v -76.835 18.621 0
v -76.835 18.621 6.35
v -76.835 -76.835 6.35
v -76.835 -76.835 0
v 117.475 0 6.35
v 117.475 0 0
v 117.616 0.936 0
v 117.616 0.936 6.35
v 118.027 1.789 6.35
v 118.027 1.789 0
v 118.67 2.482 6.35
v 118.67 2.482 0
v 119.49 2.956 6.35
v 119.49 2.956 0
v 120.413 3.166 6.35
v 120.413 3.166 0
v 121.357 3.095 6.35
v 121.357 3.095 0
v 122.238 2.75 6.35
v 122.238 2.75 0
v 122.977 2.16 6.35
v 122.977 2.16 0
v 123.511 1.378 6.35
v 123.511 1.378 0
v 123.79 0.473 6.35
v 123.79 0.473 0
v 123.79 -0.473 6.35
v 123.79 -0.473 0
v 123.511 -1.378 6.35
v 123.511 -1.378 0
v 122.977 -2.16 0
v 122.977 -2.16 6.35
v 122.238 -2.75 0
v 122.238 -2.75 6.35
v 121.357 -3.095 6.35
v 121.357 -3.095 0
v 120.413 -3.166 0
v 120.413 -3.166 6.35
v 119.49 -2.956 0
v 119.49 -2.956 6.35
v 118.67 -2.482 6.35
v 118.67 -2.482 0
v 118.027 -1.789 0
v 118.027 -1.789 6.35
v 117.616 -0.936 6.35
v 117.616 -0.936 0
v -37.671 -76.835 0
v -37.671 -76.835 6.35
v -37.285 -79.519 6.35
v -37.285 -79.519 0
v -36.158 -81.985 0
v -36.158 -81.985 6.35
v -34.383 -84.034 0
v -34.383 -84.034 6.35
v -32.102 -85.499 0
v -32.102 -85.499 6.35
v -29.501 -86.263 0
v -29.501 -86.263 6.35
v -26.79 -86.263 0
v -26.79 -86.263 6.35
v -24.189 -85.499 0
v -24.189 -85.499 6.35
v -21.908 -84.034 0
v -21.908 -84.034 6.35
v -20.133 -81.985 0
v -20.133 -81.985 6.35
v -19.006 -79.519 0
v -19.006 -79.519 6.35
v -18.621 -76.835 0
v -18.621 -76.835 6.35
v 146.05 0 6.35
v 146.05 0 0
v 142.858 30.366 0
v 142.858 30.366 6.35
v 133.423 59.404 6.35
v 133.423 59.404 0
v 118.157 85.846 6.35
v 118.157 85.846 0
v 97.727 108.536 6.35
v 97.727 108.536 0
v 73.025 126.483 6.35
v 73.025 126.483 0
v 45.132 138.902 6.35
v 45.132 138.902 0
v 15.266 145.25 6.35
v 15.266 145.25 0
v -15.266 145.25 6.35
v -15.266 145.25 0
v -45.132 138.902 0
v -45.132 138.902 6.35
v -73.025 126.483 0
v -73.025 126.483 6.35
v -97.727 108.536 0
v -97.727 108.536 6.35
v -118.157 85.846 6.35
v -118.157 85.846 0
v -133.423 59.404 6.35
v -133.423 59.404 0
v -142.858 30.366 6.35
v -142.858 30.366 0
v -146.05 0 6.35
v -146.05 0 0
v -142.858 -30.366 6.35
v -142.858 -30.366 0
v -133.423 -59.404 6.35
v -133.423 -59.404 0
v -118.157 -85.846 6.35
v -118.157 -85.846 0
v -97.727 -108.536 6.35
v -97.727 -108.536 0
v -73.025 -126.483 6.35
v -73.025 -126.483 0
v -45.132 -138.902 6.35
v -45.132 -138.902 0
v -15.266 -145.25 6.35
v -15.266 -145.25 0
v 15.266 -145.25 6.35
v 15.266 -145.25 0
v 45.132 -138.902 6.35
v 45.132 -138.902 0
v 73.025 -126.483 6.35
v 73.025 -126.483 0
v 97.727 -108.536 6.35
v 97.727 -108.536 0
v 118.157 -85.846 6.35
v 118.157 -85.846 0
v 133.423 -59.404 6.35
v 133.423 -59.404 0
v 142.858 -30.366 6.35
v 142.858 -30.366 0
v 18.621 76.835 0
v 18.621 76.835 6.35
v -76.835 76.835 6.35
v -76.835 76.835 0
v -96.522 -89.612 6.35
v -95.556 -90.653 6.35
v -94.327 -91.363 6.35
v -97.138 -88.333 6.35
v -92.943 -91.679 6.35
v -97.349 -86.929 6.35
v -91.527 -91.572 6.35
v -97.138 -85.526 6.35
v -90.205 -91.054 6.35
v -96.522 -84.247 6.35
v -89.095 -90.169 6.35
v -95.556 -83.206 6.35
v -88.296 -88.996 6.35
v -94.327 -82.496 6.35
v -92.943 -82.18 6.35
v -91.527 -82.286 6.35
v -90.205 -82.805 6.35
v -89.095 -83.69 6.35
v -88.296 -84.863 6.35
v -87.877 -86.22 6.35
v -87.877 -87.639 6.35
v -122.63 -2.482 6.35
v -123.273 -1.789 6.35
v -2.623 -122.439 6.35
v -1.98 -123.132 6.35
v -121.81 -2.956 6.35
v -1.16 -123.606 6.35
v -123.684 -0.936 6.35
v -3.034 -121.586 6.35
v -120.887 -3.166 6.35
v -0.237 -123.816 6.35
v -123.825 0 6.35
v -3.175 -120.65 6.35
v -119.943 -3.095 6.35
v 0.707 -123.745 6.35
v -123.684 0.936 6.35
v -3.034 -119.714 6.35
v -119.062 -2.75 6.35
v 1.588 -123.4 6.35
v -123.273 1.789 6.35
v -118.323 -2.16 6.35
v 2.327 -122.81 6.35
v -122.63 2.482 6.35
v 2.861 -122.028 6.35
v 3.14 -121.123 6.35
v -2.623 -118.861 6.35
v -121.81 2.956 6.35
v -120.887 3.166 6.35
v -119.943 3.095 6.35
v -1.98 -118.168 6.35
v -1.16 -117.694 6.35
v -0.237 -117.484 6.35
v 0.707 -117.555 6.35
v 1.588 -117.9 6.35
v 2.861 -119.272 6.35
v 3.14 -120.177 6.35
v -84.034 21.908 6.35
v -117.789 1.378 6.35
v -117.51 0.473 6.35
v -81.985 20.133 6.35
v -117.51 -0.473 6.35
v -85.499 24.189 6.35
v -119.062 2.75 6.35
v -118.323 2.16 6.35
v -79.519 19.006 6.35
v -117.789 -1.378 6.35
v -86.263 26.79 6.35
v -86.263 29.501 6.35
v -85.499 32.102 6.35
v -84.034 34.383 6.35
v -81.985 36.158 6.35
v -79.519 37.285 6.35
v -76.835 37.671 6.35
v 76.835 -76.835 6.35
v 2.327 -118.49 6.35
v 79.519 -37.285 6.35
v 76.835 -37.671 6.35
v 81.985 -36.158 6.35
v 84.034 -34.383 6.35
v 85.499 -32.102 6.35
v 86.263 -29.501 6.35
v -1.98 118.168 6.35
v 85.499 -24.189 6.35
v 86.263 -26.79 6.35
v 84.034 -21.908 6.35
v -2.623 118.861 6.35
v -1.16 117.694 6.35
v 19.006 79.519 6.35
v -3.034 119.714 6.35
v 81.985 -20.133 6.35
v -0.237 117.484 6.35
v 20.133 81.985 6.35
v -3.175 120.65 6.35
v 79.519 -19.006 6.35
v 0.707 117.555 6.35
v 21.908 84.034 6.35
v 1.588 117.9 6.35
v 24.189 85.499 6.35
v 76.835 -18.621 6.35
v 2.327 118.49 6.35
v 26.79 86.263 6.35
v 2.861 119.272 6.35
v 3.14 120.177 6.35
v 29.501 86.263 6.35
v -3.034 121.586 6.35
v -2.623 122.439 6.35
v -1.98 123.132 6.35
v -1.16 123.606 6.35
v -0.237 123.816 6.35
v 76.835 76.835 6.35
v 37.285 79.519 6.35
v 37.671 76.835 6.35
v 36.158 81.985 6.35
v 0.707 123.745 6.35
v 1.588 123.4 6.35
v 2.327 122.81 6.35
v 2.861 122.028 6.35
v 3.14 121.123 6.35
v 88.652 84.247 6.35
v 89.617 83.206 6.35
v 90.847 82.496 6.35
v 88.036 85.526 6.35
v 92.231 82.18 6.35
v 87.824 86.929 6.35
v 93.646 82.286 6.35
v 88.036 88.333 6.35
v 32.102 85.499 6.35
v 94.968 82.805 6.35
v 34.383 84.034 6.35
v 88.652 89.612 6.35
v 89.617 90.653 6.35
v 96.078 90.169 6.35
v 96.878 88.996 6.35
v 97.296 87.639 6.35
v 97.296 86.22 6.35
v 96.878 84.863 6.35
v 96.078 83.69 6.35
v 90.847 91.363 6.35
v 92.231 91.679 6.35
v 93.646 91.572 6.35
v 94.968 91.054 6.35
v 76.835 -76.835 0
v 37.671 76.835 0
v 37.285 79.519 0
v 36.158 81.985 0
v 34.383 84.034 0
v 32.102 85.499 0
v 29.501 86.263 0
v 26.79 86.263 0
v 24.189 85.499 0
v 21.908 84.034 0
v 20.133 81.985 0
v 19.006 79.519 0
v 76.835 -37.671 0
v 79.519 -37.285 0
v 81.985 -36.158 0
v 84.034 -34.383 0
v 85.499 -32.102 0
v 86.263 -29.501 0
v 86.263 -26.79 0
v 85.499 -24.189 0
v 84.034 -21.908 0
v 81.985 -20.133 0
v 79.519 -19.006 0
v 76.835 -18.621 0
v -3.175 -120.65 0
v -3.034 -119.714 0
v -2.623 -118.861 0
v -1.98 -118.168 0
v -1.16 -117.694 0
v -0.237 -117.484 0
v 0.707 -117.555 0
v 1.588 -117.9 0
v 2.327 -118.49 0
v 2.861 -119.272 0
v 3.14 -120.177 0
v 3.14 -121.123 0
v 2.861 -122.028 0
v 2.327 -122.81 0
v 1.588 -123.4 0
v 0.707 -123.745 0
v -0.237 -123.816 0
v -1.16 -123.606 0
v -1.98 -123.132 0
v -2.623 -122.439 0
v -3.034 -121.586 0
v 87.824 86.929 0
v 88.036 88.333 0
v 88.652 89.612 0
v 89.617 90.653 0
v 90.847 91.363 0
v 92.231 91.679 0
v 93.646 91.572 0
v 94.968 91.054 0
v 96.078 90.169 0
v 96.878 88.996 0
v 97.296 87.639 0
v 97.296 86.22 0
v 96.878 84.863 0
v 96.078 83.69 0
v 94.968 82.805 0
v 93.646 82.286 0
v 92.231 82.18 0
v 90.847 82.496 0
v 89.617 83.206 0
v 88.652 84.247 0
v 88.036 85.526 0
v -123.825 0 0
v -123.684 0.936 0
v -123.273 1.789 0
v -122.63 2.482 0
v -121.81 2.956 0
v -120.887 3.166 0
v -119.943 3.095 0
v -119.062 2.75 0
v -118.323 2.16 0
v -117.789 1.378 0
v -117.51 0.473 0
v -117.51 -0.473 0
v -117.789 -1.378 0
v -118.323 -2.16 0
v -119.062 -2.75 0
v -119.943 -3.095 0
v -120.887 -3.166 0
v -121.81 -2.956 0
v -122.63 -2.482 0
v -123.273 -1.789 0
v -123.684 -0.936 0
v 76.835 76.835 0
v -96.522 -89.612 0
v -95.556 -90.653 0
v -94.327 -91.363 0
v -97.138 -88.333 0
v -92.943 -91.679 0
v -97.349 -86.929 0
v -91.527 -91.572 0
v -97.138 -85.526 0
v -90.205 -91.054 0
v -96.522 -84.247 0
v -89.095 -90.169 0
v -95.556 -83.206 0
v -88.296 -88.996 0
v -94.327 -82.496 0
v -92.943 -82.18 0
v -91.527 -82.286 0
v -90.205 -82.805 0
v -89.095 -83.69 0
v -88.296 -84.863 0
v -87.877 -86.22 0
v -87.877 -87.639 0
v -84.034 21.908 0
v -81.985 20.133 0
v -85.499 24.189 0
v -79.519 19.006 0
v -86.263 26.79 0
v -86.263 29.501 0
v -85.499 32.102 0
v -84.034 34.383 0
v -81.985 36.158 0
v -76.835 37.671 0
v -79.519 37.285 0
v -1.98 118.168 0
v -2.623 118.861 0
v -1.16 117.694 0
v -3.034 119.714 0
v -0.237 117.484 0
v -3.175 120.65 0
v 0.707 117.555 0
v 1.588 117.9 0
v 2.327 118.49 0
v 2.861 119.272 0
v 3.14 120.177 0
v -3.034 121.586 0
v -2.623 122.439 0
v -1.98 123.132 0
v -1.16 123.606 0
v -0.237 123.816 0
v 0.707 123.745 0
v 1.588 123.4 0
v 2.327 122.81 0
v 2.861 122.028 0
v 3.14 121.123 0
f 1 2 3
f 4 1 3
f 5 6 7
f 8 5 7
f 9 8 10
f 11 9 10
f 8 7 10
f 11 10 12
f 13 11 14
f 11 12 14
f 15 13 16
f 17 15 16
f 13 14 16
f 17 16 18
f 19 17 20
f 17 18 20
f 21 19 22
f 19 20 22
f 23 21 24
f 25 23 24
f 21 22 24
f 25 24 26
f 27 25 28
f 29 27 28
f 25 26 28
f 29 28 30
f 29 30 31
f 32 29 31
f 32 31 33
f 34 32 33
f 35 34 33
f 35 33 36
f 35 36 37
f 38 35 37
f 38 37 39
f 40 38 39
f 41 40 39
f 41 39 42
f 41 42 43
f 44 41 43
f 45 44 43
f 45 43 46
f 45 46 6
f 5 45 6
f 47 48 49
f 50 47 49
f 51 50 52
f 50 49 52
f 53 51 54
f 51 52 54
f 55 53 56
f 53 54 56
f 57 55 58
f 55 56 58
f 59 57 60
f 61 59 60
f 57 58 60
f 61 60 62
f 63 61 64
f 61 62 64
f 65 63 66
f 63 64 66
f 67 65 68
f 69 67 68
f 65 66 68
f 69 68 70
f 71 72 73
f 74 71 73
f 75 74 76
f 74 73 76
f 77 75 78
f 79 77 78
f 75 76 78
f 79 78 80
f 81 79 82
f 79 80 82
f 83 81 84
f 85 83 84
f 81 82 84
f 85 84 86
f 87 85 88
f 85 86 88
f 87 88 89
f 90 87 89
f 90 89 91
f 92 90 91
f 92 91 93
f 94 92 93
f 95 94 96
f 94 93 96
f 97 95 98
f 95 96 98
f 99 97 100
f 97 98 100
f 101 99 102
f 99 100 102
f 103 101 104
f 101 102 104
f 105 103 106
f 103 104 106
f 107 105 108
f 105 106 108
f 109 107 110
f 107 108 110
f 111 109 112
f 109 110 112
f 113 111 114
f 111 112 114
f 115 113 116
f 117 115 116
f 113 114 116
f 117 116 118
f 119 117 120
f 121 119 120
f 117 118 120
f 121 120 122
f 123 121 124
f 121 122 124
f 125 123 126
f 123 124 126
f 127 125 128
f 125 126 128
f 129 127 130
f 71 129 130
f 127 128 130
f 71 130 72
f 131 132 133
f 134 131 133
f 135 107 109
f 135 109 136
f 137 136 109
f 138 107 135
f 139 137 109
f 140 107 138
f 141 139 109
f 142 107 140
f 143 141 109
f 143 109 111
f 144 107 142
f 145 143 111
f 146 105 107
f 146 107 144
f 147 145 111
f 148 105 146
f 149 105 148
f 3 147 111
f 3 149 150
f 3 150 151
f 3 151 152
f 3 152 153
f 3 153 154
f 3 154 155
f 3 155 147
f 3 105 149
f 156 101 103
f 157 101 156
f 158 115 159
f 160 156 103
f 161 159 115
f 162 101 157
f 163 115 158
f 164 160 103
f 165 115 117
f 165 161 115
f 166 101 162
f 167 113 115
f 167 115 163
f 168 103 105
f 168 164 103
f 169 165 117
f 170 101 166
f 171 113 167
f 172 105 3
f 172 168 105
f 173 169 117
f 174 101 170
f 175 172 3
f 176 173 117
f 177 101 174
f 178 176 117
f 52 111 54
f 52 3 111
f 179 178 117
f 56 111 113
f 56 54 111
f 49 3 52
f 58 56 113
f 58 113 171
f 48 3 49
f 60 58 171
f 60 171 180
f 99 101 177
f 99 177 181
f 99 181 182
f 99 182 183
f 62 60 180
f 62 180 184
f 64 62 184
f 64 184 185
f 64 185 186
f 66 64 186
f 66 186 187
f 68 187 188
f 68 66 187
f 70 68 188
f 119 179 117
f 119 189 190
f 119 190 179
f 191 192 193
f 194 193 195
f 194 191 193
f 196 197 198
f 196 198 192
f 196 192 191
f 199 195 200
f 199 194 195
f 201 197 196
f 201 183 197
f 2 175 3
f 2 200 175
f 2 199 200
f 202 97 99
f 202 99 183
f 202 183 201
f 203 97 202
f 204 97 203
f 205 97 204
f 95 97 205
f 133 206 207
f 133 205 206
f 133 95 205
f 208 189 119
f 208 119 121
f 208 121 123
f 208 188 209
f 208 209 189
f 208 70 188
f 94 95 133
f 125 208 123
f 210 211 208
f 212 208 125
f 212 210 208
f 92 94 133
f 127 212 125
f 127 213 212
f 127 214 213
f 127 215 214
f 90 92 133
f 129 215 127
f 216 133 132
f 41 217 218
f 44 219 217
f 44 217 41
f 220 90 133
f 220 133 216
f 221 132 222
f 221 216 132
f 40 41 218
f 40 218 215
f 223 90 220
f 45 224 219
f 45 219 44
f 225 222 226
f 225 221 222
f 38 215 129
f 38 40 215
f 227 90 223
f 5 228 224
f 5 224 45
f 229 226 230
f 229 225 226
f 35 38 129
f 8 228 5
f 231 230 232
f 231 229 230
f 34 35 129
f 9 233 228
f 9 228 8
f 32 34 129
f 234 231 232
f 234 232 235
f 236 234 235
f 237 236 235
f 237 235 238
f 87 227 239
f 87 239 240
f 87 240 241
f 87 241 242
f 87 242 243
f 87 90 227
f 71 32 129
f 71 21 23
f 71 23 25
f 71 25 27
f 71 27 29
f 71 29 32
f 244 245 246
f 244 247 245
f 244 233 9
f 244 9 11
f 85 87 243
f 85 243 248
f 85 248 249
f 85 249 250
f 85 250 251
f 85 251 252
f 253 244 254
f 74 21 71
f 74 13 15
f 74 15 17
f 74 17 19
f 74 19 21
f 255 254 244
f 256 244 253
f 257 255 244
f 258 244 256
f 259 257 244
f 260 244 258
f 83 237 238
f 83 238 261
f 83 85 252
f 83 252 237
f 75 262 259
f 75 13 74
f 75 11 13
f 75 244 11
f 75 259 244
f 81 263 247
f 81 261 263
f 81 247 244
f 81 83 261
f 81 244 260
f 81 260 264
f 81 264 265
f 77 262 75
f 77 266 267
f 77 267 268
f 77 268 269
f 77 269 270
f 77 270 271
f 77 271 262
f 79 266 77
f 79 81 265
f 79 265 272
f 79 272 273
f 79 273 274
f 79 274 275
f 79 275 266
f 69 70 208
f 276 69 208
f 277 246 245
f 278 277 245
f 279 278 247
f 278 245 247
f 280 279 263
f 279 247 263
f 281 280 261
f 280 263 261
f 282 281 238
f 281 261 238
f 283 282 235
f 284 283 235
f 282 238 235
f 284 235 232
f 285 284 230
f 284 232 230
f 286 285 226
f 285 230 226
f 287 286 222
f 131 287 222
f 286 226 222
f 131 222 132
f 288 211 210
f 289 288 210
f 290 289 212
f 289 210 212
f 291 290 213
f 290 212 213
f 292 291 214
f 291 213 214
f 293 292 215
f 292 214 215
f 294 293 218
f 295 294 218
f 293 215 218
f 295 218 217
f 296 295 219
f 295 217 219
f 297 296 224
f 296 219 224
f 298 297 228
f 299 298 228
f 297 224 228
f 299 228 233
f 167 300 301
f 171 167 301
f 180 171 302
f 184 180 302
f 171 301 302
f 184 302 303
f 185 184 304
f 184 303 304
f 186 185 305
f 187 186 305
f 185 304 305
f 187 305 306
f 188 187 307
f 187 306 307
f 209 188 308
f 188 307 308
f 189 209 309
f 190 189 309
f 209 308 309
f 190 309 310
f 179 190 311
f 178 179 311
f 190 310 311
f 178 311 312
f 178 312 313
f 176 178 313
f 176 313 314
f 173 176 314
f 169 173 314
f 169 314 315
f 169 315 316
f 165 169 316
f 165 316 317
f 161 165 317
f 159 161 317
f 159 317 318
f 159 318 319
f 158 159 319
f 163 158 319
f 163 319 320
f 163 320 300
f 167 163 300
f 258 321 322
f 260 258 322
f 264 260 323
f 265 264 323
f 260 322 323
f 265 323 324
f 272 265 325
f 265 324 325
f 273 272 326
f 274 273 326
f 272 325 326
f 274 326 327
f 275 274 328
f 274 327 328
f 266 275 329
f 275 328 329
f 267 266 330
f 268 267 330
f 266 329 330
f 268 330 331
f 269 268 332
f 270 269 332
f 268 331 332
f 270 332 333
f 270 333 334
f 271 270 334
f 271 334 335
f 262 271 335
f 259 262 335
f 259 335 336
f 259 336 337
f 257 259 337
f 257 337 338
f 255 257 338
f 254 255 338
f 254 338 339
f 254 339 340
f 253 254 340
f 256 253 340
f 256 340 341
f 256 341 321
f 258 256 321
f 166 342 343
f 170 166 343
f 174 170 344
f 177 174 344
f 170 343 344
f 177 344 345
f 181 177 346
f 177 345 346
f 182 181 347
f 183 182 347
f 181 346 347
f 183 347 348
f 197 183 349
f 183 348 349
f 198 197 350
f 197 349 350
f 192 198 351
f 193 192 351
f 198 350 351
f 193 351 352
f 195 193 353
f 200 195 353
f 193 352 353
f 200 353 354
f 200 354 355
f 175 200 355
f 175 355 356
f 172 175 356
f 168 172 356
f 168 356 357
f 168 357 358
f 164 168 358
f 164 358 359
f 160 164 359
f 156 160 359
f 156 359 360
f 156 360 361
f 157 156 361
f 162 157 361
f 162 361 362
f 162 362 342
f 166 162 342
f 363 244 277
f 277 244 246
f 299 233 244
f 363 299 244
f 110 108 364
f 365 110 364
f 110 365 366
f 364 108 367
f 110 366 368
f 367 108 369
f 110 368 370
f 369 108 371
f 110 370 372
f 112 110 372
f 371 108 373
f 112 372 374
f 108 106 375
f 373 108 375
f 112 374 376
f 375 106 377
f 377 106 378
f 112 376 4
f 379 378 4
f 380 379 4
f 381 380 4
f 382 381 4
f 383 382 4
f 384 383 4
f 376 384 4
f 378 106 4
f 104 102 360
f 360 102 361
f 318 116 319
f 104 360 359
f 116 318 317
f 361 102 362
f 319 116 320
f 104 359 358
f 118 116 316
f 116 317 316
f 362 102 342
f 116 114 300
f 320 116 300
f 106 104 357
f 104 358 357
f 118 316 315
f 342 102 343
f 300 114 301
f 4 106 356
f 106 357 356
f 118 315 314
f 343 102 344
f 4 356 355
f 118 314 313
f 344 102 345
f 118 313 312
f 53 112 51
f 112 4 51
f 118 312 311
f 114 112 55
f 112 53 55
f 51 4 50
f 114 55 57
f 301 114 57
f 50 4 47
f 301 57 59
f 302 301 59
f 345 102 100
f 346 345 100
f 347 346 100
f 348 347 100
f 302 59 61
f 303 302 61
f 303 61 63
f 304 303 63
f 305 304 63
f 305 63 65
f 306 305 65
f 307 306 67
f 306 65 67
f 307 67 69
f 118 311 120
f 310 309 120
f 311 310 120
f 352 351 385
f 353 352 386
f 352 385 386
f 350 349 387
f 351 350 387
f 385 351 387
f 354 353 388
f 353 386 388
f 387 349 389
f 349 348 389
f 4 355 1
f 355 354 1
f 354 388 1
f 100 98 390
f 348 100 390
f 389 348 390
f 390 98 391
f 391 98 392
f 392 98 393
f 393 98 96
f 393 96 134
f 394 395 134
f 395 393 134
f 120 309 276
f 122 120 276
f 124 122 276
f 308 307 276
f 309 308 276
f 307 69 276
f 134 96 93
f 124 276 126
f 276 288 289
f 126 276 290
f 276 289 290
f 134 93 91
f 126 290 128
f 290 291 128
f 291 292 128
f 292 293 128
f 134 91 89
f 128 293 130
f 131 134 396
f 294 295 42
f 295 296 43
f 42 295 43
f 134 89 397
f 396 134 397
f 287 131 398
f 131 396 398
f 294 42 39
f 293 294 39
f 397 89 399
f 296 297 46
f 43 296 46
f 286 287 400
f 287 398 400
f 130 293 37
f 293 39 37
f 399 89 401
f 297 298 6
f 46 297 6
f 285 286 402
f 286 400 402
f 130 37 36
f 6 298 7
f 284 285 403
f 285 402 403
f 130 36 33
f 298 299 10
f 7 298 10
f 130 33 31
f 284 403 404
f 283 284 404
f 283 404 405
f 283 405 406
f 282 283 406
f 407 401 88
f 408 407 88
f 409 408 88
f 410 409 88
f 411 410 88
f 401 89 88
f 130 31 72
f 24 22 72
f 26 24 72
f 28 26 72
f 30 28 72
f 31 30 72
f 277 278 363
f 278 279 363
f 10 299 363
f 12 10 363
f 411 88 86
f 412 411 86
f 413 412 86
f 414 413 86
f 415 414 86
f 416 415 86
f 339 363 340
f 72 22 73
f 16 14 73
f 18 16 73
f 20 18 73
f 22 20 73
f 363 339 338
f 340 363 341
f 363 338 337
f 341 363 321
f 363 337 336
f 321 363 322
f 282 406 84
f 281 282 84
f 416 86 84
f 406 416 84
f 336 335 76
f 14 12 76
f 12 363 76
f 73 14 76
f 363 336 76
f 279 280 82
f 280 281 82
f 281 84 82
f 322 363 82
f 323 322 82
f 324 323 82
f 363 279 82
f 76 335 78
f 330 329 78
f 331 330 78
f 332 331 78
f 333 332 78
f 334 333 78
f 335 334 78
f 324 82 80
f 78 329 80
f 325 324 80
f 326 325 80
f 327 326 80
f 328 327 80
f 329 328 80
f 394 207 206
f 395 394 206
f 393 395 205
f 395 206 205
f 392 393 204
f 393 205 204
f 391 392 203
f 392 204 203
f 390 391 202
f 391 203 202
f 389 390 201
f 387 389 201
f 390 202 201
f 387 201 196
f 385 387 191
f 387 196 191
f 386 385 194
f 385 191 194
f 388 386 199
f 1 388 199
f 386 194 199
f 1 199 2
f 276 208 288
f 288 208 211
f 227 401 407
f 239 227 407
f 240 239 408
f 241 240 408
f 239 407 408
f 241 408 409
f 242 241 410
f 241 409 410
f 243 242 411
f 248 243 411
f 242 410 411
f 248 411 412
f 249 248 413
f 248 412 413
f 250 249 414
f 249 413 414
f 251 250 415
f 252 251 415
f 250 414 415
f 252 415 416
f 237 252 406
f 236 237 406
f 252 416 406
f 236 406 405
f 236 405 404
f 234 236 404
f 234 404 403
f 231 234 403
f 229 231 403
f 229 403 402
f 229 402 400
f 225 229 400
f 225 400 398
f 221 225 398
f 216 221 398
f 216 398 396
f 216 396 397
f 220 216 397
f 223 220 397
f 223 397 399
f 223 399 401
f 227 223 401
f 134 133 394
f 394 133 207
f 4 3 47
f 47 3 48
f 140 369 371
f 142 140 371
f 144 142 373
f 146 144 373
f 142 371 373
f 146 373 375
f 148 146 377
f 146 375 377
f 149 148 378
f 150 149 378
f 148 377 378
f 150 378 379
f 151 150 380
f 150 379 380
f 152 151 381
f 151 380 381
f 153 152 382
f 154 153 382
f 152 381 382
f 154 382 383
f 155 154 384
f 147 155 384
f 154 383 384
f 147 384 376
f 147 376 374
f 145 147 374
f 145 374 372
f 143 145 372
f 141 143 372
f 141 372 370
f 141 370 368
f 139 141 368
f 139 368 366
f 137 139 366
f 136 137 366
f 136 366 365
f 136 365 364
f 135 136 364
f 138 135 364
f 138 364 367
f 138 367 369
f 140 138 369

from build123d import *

# Parameters (mm, degrees)
F0_R     = 146.05
F1_DEPTH = 6.35
F3_D     = 6.35
F4_D     = 9.525
F6_DEPTH = 6.351


with BuildPart() as f1:
    # F0 (on Top) → F1 (new body)
    with BuildSketch(Plane.XY):
        Circle(F0_R)
    extrude(amount=F1_DEPTH)

    # F3 (through all)
    with Locations(Plane.XY.offset(6.35)):
        with Locations((120.65, 0), (0, -120.65), (-120.65, 0), (0, 120.65)):
            Hole(F3_D / 2)

    # F4 (through all)
    with Locations(Plane.XY.offset(6.35)):
        with Locations((-92.586648, -86.929354), (92.586648, 86.929354)):
            Hole(F4_D / 2)

    # F5 (on face) → F6 (cut, through all)
    with BuildSketch(Plane.XY.offset(6.35)):
        with BuildLine():
            Line((76.835, -18.620527), (76.835, 76.835))
            Line((76.835, 76.835), (37.670527, 76.835))
            ThreePointArc((37.670527, 76.835), (28.145527, 86.36), (18.620527, 76.835))
            Line((18.620527, 76.835), (-76.835, 76.835))
            Line((-76.835, 76.835), (-76.835, 37.670527))
            ThreePointArc((-76.835, 37.670527), (-86.36, 28.145527), (-76.835, 18.620527))
            Line((-76.835, 18.620527), (-76.835, -76.835))
            Line((-76.835, -76.835), (-37.670527, -76.835))
            ThreePointArc((-37.670527, -76.835), (-28.145527, -86.36), (-18.620527, -76.835))
            Line((-18.620527, -76.835), (76.835, -76.835))
            Line((76.835, -76.835), (76.835, -37.670527))
            ThreePointArc((76.835, -37.670527), (86.36, -28.145527), (76.835, -18.620527))
        make_face()
    extrude(amount=-F6_DEPTH, mode=Mode.SUBTRACT)


solid = f1.part
